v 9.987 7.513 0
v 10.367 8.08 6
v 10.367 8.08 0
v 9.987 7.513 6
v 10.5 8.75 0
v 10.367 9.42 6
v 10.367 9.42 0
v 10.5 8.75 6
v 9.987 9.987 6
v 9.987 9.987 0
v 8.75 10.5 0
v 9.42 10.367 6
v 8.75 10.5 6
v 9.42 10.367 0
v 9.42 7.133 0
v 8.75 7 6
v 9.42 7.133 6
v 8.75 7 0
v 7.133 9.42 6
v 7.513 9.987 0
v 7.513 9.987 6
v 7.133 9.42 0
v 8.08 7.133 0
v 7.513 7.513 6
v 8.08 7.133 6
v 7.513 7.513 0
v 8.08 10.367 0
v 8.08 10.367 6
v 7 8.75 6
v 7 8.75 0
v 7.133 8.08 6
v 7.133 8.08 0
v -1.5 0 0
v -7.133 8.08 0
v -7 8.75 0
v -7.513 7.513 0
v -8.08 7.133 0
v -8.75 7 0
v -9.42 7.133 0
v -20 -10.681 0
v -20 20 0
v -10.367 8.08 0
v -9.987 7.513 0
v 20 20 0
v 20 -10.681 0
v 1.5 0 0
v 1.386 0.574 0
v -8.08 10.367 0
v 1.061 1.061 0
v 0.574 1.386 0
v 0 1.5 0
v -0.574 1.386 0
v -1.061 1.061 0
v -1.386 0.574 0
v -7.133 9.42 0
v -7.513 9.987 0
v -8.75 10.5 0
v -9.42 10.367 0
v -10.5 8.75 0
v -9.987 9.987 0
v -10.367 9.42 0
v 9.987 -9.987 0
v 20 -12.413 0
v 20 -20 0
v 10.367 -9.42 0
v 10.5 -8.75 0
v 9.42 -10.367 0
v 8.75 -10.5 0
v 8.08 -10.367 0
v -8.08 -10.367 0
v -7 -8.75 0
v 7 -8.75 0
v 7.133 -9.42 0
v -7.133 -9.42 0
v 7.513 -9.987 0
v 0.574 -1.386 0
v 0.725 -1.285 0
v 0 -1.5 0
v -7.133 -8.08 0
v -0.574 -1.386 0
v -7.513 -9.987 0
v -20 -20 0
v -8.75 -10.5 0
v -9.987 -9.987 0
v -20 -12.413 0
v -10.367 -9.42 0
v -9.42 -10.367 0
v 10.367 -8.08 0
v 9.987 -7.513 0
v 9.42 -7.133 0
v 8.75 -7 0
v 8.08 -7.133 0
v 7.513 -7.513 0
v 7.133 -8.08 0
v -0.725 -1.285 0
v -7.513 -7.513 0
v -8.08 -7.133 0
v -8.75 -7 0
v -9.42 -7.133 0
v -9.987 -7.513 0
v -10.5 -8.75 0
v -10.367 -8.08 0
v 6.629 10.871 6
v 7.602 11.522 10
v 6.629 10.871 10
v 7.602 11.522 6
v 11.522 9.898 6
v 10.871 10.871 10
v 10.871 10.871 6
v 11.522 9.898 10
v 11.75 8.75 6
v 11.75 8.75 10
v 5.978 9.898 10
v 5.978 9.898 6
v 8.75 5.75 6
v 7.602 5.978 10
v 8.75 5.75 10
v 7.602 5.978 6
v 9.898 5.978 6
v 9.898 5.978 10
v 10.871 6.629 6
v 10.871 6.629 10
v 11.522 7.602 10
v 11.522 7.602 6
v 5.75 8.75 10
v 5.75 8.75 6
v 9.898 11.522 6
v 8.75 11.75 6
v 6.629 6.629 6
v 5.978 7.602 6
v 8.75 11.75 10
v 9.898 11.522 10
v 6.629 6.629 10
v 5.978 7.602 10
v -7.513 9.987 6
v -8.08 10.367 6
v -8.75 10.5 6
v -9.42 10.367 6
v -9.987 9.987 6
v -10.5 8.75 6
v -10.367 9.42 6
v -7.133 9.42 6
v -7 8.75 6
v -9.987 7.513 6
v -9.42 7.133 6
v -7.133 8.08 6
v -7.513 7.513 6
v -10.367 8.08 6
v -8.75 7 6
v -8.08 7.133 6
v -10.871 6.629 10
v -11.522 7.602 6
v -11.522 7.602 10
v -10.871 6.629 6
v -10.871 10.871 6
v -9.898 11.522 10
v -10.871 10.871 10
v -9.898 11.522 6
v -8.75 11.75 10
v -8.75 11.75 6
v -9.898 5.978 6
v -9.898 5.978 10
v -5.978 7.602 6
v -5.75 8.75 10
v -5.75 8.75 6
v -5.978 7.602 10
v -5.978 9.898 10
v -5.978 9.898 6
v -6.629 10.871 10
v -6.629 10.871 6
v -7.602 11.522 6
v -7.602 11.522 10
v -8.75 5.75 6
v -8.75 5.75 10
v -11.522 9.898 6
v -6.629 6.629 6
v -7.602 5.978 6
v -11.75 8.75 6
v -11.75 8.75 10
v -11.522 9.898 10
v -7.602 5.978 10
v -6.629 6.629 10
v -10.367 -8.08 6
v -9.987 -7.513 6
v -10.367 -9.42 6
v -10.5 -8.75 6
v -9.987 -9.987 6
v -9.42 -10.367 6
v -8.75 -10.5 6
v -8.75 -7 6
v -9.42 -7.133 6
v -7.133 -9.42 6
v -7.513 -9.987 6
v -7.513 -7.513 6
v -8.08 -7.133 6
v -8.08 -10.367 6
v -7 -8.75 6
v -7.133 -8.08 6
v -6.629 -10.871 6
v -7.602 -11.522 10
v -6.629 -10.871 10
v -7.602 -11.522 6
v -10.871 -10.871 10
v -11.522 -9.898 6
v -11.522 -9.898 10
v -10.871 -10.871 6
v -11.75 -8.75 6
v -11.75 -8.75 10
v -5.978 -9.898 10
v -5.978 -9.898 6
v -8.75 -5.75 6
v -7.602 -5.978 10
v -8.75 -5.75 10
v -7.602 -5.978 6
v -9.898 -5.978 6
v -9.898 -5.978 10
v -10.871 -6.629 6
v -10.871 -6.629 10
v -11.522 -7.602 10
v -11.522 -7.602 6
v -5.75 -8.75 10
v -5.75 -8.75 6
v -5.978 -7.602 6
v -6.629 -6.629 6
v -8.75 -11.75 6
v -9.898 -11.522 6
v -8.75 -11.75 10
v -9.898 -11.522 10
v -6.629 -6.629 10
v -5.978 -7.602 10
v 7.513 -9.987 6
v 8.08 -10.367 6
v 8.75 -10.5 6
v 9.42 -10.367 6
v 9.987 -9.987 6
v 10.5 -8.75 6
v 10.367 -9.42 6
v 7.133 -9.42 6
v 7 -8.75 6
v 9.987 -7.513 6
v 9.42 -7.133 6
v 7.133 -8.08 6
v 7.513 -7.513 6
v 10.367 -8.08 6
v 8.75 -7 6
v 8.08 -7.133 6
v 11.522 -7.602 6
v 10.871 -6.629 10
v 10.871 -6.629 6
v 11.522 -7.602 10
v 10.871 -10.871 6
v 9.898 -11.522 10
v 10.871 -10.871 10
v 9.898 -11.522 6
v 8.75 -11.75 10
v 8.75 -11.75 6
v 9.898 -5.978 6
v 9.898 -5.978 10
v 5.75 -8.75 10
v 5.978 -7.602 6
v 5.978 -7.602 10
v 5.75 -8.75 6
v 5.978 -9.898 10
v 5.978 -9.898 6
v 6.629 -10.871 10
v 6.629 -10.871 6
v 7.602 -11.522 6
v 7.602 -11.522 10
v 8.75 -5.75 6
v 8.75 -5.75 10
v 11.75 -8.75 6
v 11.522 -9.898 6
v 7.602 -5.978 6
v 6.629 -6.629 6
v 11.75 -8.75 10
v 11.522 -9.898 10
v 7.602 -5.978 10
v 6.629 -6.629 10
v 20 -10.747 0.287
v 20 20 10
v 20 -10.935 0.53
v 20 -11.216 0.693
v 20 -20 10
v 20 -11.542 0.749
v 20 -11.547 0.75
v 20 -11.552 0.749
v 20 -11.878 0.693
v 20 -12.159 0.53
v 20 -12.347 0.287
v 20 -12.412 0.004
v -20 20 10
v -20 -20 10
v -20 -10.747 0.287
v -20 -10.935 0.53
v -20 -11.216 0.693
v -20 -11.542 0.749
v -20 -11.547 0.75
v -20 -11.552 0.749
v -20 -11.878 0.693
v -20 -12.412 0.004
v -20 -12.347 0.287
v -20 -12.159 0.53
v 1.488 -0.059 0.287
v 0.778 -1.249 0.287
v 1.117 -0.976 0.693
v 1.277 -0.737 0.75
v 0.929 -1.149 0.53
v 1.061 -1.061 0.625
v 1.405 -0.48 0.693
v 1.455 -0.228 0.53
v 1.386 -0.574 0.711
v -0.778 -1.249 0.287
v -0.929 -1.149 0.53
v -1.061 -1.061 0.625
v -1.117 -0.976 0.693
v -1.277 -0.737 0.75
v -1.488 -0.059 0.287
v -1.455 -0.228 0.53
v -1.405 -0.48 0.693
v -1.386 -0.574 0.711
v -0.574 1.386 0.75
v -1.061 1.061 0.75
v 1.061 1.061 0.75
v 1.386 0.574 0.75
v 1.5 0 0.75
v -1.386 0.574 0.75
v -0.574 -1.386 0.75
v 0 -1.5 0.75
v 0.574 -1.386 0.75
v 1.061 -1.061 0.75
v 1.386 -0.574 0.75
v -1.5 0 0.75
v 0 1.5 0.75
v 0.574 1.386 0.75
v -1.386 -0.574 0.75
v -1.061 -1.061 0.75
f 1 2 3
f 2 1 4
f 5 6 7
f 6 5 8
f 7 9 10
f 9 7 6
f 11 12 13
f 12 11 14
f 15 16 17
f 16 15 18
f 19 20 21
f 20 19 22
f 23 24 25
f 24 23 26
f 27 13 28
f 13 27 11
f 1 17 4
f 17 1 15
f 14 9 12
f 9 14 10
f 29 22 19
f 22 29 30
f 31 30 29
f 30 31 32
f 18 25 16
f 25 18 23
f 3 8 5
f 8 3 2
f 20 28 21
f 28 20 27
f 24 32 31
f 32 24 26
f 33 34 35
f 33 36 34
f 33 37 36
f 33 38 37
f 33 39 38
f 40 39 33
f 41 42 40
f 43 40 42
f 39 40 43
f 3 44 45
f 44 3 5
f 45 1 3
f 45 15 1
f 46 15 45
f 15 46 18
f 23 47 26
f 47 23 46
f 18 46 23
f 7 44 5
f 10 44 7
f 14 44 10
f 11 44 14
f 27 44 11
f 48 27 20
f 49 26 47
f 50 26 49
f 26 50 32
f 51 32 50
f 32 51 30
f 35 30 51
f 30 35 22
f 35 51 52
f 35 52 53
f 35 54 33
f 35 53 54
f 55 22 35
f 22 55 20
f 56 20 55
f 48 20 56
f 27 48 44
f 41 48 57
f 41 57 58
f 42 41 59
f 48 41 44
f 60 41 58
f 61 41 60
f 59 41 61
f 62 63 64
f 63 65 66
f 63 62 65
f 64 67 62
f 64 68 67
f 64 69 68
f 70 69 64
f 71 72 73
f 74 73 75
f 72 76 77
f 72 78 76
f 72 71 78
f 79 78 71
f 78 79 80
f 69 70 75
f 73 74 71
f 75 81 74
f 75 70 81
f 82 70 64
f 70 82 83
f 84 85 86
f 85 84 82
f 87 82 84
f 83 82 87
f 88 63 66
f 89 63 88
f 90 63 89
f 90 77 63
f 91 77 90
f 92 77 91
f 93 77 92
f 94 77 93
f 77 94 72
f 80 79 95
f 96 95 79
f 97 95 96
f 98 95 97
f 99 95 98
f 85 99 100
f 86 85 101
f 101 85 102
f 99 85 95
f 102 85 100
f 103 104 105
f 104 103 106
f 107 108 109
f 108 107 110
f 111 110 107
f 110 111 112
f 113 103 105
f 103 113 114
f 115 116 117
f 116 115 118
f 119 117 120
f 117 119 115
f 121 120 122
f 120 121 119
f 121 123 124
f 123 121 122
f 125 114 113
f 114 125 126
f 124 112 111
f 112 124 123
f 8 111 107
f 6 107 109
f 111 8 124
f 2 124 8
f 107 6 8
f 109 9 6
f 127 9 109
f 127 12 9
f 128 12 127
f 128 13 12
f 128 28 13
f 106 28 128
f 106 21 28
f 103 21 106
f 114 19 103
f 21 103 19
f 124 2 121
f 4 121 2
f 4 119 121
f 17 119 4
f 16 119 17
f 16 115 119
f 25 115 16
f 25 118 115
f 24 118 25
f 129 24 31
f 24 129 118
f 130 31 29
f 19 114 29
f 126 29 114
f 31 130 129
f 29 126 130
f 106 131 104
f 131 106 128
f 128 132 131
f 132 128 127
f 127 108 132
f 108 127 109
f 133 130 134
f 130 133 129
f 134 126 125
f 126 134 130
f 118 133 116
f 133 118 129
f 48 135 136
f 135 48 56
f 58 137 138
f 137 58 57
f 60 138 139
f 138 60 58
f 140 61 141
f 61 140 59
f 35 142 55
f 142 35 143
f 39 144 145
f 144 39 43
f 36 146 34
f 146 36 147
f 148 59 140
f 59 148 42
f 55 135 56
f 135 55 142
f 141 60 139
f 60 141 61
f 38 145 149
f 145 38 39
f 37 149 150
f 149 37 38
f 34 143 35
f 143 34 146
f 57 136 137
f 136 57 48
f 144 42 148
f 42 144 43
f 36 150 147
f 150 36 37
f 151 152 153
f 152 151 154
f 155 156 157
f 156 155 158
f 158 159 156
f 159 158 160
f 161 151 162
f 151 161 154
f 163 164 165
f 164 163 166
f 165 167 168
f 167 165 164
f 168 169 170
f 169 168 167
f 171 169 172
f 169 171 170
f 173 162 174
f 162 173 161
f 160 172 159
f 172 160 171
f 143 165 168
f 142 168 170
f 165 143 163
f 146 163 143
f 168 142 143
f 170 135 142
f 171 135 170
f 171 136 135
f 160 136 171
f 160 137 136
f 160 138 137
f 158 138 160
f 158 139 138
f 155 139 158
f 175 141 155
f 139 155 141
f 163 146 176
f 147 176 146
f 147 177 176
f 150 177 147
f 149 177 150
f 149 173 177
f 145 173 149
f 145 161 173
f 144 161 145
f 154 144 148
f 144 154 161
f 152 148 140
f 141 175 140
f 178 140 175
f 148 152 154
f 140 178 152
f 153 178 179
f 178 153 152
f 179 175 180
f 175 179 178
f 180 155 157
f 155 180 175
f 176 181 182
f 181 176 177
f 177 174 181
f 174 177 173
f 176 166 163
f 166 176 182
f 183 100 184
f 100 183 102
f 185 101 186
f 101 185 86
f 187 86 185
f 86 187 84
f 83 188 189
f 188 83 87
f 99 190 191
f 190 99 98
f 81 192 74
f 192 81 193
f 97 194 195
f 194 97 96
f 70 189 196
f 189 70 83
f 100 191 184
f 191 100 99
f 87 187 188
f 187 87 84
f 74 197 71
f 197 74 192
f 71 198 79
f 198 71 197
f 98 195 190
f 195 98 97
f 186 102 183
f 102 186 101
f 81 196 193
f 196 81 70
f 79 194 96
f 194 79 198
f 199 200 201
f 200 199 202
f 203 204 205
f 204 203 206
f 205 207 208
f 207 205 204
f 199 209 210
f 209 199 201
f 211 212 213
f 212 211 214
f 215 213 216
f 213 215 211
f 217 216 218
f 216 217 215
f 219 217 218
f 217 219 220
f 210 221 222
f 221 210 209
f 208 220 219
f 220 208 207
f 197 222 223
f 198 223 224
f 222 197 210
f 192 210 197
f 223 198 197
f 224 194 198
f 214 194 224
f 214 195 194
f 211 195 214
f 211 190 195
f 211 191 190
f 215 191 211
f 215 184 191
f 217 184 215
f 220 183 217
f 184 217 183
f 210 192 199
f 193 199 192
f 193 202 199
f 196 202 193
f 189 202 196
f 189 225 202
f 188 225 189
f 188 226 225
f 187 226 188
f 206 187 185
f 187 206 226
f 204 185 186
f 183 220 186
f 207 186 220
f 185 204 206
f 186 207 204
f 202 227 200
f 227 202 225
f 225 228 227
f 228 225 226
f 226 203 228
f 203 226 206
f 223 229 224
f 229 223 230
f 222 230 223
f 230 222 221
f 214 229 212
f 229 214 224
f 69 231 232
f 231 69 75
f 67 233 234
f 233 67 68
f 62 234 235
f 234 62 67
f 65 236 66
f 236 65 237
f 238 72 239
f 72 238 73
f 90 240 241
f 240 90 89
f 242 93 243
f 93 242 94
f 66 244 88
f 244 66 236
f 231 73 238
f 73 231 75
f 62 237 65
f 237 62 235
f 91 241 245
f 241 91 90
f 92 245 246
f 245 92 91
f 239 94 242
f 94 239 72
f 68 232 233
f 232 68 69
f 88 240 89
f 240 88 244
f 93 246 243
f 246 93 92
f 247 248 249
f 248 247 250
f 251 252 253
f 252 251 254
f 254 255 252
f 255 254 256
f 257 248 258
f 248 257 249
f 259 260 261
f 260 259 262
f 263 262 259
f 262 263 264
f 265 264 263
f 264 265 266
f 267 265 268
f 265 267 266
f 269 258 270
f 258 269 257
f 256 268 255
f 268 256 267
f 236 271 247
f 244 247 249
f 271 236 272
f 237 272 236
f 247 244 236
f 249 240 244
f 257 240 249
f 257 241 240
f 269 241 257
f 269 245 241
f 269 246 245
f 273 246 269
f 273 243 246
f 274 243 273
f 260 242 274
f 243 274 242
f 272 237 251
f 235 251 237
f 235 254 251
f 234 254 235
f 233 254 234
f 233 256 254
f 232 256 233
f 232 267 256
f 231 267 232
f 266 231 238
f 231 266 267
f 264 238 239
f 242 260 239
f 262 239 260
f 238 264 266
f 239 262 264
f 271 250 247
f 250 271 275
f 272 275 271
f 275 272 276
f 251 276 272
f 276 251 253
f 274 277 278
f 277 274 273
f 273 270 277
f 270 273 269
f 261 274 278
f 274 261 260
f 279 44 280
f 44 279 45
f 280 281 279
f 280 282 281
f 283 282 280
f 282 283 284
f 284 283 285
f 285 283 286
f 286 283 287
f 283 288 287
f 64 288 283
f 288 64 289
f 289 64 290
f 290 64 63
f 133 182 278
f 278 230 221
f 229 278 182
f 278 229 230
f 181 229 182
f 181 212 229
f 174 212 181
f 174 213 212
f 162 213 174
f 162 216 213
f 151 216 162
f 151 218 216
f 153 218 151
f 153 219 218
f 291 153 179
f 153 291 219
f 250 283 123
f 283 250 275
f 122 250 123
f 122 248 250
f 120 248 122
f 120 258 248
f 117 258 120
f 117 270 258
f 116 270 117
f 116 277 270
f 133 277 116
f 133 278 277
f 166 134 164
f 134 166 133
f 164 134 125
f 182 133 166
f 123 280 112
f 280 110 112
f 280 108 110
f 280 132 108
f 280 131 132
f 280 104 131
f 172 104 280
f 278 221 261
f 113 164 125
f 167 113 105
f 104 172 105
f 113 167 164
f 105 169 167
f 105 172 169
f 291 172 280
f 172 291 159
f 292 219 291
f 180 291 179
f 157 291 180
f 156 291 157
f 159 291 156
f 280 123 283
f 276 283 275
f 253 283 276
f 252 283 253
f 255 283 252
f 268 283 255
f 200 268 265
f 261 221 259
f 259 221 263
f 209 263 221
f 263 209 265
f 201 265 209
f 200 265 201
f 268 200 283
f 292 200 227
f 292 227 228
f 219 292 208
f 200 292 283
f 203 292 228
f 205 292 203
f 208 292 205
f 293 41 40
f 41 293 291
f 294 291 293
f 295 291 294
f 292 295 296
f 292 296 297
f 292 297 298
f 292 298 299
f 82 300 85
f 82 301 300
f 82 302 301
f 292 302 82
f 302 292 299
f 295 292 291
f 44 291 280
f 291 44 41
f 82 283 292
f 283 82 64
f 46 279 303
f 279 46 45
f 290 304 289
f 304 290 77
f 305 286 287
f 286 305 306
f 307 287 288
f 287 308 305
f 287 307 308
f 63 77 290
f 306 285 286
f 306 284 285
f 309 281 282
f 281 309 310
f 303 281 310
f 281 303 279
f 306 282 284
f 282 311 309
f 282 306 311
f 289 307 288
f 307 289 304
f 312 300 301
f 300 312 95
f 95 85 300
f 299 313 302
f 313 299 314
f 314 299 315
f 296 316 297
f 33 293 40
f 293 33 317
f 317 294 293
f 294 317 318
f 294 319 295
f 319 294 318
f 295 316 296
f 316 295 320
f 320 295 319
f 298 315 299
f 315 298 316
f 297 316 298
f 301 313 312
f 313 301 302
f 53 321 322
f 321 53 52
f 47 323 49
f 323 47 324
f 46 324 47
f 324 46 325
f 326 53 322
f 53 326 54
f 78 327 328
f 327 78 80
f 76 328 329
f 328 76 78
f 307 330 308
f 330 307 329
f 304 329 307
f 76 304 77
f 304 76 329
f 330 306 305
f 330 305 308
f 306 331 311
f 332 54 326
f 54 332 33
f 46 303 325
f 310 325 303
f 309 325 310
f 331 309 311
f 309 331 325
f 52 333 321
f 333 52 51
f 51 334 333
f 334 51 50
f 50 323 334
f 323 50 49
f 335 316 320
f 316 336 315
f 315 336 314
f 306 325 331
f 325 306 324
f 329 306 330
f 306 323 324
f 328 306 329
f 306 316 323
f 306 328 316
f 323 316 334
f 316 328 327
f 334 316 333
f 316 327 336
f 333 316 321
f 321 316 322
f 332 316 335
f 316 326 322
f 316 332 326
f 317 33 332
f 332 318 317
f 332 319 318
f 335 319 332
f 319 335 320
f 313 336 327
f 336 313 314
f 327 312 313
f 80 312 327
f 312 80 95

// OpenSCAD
// file: uhf_spacer.scad
module uhf_spacer(
  size=[40, 40, 18],
  bolt_spacing=17.5,
  bolt_offset=[0,0],
  bolt_d=3.5,
  center_d=16,
  cb_depth=0,
  cb_diameter=0,
) {

  difference() {
    translate([0,0, size[2]/2])
      cube(size, center=true);
  
    if (center_d > 0) {
      cylinder(r=center_d/2, h=size[2]);
    }

    for (i = [0 : 1 : 3]) {
      rotate([0, 0, i*90])
      translate([bolt_spacing/2, bolt_spacing/2, 0]) {
        cylinder(r=bolt_d/2, h=size[2]);
        if (cb_depth > 0) {
          translate([0, 0, size[2] - cb_depth])
            cylinder(r=cb_diameter/2, h=cb_depth+1);
        }
      }
    }
  }
}

uhf_spacer();
// main file
use <uhf_spacer.scad>

/**
 * This cap is designed to hold antenna elements
 * and cover the UHF connector and wiring.
 * The thickness of this cap is chosen to work with
 * a 30mm long M3 bolt
 *
 * Cap + Spacer + Connector Flange + Washer + Nut < 30
 *  6     18               3           1       4  = 
 */
module cap(
  size=[40, 40, 10],
  bolt_spacing=17.5,
  bolt_d=3.5,
  wire_d=1.5,
  angle=120,
  counterbore_depth=4,
  counterbore_diameter=6
) {

  difference() {
    uhf_spacer(
      size=size,
      center_d=0,
      bolt_spacing=bolt_spacing,
      bolt_d=bolt_d,
      cb_depth=counterbore_depth,
      cb_diameter=counterbore_diameter
    );

    for (i = [-1, 1]) {
      rotate([0,0,-i*angle*0.5])
      rotate([90, 0, 0]) {
        cylinder(r=wire_d/2, h=pow(size[0], 2));
      }
    }
    cylinder(r=wire_d, h=wire_d/2);
  }
}

cap($fn=16);
